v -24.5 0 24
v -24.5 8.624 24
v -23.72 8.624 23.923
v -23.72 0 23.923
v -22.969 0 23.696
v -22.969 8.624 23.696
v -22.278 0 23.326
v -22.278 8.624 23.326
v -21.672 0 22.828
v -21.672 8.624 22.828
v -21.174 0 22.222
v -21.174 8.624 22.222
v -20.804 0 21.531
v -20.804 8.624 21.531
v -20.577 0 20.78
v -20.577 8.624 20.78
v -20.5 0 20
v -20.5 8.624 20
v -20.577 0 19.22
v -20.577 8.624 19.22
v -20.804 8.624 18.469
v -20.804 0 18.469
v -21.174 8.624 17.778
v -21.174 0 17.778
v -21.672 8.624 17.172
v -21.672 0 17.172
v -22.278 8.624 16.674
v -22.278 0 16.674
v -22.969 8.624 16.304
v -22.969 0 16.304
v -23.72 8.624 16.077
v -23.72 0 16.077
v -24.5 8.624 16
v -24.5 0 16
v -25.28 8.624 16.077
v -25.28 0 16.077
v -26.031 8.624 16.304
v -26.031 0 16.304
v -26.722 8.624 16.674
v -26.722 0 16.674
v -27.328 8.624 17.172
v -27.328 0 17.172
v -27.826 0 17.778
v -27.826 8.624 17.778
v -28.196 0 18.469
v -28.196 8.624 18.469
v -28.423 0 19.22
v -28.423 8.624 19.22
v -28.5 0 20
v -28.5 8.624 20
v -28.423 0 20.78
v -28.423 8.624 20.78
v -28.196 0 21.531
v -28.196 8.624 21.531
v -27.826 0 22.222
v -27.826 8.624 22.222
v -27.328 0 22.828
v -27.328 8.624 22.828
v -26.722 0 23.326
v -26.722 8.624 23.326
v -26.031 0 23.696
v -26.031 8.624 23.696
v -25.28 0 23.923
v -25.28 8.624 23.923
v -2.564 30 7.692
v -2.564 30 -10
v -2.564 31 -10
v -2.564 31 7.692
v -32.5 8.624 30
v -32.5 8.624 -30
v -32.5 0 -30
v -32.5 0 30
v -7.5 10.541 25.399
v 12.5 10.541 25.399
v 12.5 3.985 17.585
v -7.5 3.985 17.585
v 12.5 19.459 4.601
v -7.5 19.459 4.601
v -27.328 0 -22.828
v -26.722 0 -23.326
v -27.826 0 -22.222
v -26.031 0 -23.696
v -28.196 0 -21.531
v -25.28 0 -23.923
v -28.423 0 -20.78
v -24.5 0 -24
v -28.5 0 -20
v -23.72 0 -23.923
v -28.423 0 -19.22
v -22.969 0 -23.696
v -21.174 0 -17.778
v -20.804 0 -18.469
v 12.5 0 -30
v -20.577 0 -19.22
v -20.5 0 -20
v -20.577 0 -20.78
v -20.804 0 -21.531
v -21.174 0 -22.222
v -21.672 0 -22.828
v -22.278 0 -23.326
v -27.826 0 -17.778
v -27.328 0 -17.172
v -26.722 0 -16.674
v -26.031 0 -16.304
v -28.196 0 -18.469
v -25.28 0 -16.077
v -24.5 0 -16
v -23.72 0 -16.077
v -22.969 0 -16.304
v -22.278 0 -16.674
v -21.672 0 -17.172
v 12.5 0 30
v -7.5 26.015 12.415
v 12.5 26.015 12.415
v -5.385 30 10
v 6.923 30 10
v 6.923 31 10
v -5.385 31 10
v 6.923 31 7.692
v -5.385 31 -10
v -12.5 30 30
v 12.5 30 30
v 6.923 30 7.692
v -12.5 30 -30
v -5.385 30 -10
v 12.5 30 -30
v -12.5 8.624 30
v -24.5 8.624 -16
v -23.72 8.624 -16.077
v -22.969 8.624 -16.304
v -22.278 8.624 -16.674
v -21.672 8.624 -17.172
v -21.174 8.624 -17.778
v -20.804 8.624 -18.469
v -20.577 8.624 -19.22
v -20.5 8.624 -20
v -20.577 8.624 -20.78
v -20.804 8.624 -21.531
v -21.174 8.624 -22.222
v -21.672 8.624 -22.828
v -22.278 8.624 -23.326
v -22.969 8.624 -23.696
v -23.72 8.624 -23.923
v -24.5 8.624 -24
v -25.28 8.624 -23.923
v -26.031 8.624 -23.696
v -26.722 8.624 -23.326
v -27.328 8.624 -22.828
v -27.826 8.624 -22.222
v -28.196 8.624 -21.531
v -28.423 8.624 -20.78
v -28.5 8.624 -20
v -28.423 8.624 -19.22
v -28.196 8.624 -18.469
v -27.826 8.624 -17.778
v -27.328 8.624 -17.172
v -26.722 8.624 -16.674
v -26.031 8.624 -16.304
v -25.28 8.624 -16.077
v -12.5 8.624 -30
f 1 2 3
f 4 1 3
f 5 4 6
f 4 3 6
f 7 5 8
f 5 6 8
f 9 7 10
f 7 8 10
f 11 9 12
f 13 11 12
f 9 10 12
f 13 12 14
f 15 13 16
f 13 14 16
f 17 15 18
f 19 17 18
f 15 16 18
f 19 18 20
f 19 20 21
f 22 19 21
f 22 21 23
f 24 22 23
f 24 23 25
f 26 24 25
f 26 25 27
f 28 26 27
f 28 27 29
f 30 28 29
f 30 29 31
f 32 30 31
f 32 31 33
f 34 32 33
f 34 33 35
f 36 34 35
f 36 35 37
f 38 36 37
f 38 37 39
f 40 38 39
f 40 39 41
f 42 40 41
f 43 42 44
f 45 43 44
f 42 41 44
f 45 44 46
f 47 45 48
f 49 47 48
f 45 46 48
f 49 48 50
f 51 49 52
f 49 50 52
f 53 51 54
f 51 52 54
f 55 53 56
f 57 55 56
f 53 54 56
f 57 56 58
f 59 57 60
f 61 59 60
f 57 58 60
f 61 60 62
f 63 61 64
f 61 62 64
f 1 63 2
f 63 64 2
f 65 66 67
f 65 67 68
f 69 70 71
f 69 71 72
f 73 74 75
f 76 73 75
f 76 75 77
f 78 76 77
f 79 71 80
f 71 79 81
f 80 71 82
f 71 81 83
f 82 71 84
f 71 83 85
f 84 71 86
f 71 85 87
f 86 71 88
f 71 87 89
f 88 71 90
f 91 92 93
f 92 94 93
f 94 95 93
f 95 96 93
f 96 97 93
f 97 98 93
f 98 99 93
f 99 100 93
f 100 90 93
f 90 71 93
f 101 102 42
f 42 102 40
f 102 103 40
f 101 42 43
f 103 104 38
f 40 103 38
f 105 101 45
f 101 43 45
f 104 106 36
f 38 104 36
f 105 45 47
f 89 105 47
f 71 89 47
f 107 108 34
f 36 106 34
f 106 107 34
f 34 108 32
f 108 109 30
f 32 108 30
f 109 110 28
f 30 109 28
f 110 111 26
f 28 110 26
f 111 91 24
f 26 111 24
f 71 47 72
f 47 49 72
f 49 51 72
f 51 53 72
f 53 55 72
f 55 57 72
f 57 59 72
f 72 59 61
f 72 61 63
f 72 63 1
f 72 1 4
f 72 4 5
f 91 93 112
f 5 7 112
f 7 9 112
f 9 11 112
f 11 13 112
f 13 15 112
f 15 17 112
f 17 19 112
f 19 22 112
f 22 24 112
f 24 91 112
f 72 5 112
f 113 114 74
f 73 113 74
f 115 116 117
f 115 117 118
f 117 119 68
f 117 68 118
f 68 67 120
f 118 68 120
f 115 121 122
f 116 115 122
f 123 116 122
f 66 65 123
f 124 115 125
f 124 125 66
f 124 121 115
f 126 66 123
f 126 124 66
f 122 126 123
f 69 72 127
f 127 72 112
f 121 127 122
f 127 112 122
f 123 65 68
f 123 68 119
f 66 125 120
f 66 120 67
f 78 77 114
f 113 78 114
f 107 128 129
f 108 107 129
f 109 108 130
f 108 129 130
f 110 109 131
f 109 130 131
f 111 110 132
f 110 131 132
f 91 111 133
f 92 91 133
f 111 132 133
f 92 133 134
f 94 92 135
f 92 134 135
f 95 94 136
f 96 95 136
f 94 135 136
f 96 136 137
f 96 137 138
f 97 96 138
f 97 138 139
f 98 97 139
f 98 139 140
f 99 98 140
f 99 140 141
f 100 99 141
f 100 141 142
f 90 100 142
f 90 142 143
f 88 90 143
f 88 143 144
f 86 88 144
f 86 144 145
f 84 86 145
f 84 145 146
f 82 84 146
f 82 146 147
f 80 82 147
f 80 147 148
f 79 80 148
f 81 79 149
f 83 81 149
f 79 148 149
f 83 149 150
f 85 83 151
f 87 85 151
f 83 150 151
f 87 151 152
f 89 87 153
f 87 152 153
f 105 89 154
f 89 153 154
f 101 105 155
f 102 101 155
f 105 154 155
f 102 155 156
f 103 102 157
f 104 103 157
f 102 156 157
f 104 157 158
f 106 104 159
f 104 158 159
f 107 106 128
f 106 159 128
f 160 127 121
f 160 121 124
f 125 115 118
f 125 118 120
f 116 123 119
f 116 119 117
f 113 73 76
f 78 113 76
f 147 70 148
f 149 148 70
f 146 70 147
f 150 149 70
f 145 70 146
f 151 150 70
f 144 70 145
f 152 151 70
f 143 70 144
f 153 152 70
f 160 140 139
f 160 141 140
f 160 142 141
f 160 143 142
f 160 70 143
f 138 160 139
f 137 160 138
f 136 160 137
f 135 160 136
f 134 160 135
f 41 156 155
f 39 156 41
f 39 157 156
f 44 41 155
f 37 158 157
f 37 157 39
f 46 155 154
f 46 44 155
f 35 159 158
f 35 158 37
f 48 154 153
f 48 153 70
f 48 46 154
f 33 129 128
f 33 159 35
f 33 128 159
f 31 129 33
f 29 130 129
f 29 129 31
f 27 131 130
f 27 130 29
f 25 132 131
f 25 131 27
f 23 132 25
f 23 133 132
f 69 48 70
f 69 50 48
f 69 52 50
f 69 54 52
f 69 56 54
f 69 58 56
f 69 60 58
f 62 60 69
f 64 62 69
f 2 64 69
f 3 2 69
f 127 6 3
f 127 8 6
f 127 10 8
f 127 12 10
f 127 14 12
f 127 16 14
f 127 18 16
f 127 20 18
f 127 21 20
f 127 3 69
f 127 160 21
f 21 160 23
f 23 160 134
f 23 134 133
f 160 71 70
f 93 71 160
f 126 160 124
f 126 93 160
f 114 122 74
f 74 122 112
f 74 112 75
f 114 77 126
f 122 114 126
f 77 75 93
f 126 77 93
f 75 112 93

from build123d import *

# Parameters (mm, degrees)
SKETCH1_W           = 25
SKETCH1_H           = 60
BOSS_EXTRUDE1_DEPTH = 30
SKETCH2_W           = 60
SKETCH2_H           = 8.623813306
BOSS_EXTRUDE2_DEPTH = 20
SKETCH3_R           = 4
CUT_EXTRUDE1_DEPTH  = 9.623813306
CUT_EXTRUDE2_DEPTH  = 20
BOSS_EXTRUDE3_DEPTH = 1


with BuildPart() as part:
    # Sketch1 → Boss-Extrude1 (new body)
    with BuildSketch(Plane(origin=(0, 0, 0), x_dir=(1, 0, 0), z_dir=(0, 1, 0))):
        Rectangle(SKETCH1_W, SKETCH1_H)
    extrude(amount=BOSS_EXTRUDE1_DEPTH)

    # Sketch2 → Boss-Extrude2 (add)
    with BuildSketch(Plane.ZY.offset(12.5)):
        with Locations((0, 4.311906653)):
            Rectangle(SKETCH2_W, SKETCH2_H)
    extrude(amount=BOSS_EXTRUDE2_DEPTH)

    # Sketch3 → Cut-Extrude1 (cut, through all)
    with BuildSketch(Plane(origin=(0, 8.623813306, 0), x_dir=(1, 0, 0), z_dir=(0, 1, 0))):
        with Locations(Location((-24.5, 20, 0), (0, 0, 270))):  # turned: the seam where the file's is
            Circle(SKETCH3_R)
        with Locations(Location((-24.5, -20, 0), (0, 0, 270))):  # turned: the seam where the file's is
            Circle(SKETCH3_R)
    extrude(amount=-CUT_EXTRUDE1_DEPTH, mode=Mode.SUBTRACT)

    # Sketch4 → Cut-Extrude2 (cut)
    with BuildSketch(Plane(origin=(12.5, 0, 0), x_dir=(0, 0, -1), z_dir=(1, 0, 0))):
        Polygon((-17.585328198, 3.984734315), (-4.601018482, 19.458832066), (-12.414671802, 26.015265685), (-25.398981518, 10.541167934), align=None)
    extrude(amount=-CUT_EXTRUDE2_DEPTH, mode=Mode.SUBTRACT)

    # Sketch5 → Boss-Extrude3 (add)
    with BuildSketch(Plane(origin=(0, 30, 0), x_dir=(1, 0, 0), z_dir=(0, 1, 0))):
        Polygon((-5.384615385, -10), (-5.384615385, 10), (-2.564102564, 10), (-2.564102564, -7.692307692), (6.923076923, -7.692307692), (6.923076923, -10), align=None)
    extrude(amount=BOSS_EXTRUDE3_DEPTH)


solid = part.part
